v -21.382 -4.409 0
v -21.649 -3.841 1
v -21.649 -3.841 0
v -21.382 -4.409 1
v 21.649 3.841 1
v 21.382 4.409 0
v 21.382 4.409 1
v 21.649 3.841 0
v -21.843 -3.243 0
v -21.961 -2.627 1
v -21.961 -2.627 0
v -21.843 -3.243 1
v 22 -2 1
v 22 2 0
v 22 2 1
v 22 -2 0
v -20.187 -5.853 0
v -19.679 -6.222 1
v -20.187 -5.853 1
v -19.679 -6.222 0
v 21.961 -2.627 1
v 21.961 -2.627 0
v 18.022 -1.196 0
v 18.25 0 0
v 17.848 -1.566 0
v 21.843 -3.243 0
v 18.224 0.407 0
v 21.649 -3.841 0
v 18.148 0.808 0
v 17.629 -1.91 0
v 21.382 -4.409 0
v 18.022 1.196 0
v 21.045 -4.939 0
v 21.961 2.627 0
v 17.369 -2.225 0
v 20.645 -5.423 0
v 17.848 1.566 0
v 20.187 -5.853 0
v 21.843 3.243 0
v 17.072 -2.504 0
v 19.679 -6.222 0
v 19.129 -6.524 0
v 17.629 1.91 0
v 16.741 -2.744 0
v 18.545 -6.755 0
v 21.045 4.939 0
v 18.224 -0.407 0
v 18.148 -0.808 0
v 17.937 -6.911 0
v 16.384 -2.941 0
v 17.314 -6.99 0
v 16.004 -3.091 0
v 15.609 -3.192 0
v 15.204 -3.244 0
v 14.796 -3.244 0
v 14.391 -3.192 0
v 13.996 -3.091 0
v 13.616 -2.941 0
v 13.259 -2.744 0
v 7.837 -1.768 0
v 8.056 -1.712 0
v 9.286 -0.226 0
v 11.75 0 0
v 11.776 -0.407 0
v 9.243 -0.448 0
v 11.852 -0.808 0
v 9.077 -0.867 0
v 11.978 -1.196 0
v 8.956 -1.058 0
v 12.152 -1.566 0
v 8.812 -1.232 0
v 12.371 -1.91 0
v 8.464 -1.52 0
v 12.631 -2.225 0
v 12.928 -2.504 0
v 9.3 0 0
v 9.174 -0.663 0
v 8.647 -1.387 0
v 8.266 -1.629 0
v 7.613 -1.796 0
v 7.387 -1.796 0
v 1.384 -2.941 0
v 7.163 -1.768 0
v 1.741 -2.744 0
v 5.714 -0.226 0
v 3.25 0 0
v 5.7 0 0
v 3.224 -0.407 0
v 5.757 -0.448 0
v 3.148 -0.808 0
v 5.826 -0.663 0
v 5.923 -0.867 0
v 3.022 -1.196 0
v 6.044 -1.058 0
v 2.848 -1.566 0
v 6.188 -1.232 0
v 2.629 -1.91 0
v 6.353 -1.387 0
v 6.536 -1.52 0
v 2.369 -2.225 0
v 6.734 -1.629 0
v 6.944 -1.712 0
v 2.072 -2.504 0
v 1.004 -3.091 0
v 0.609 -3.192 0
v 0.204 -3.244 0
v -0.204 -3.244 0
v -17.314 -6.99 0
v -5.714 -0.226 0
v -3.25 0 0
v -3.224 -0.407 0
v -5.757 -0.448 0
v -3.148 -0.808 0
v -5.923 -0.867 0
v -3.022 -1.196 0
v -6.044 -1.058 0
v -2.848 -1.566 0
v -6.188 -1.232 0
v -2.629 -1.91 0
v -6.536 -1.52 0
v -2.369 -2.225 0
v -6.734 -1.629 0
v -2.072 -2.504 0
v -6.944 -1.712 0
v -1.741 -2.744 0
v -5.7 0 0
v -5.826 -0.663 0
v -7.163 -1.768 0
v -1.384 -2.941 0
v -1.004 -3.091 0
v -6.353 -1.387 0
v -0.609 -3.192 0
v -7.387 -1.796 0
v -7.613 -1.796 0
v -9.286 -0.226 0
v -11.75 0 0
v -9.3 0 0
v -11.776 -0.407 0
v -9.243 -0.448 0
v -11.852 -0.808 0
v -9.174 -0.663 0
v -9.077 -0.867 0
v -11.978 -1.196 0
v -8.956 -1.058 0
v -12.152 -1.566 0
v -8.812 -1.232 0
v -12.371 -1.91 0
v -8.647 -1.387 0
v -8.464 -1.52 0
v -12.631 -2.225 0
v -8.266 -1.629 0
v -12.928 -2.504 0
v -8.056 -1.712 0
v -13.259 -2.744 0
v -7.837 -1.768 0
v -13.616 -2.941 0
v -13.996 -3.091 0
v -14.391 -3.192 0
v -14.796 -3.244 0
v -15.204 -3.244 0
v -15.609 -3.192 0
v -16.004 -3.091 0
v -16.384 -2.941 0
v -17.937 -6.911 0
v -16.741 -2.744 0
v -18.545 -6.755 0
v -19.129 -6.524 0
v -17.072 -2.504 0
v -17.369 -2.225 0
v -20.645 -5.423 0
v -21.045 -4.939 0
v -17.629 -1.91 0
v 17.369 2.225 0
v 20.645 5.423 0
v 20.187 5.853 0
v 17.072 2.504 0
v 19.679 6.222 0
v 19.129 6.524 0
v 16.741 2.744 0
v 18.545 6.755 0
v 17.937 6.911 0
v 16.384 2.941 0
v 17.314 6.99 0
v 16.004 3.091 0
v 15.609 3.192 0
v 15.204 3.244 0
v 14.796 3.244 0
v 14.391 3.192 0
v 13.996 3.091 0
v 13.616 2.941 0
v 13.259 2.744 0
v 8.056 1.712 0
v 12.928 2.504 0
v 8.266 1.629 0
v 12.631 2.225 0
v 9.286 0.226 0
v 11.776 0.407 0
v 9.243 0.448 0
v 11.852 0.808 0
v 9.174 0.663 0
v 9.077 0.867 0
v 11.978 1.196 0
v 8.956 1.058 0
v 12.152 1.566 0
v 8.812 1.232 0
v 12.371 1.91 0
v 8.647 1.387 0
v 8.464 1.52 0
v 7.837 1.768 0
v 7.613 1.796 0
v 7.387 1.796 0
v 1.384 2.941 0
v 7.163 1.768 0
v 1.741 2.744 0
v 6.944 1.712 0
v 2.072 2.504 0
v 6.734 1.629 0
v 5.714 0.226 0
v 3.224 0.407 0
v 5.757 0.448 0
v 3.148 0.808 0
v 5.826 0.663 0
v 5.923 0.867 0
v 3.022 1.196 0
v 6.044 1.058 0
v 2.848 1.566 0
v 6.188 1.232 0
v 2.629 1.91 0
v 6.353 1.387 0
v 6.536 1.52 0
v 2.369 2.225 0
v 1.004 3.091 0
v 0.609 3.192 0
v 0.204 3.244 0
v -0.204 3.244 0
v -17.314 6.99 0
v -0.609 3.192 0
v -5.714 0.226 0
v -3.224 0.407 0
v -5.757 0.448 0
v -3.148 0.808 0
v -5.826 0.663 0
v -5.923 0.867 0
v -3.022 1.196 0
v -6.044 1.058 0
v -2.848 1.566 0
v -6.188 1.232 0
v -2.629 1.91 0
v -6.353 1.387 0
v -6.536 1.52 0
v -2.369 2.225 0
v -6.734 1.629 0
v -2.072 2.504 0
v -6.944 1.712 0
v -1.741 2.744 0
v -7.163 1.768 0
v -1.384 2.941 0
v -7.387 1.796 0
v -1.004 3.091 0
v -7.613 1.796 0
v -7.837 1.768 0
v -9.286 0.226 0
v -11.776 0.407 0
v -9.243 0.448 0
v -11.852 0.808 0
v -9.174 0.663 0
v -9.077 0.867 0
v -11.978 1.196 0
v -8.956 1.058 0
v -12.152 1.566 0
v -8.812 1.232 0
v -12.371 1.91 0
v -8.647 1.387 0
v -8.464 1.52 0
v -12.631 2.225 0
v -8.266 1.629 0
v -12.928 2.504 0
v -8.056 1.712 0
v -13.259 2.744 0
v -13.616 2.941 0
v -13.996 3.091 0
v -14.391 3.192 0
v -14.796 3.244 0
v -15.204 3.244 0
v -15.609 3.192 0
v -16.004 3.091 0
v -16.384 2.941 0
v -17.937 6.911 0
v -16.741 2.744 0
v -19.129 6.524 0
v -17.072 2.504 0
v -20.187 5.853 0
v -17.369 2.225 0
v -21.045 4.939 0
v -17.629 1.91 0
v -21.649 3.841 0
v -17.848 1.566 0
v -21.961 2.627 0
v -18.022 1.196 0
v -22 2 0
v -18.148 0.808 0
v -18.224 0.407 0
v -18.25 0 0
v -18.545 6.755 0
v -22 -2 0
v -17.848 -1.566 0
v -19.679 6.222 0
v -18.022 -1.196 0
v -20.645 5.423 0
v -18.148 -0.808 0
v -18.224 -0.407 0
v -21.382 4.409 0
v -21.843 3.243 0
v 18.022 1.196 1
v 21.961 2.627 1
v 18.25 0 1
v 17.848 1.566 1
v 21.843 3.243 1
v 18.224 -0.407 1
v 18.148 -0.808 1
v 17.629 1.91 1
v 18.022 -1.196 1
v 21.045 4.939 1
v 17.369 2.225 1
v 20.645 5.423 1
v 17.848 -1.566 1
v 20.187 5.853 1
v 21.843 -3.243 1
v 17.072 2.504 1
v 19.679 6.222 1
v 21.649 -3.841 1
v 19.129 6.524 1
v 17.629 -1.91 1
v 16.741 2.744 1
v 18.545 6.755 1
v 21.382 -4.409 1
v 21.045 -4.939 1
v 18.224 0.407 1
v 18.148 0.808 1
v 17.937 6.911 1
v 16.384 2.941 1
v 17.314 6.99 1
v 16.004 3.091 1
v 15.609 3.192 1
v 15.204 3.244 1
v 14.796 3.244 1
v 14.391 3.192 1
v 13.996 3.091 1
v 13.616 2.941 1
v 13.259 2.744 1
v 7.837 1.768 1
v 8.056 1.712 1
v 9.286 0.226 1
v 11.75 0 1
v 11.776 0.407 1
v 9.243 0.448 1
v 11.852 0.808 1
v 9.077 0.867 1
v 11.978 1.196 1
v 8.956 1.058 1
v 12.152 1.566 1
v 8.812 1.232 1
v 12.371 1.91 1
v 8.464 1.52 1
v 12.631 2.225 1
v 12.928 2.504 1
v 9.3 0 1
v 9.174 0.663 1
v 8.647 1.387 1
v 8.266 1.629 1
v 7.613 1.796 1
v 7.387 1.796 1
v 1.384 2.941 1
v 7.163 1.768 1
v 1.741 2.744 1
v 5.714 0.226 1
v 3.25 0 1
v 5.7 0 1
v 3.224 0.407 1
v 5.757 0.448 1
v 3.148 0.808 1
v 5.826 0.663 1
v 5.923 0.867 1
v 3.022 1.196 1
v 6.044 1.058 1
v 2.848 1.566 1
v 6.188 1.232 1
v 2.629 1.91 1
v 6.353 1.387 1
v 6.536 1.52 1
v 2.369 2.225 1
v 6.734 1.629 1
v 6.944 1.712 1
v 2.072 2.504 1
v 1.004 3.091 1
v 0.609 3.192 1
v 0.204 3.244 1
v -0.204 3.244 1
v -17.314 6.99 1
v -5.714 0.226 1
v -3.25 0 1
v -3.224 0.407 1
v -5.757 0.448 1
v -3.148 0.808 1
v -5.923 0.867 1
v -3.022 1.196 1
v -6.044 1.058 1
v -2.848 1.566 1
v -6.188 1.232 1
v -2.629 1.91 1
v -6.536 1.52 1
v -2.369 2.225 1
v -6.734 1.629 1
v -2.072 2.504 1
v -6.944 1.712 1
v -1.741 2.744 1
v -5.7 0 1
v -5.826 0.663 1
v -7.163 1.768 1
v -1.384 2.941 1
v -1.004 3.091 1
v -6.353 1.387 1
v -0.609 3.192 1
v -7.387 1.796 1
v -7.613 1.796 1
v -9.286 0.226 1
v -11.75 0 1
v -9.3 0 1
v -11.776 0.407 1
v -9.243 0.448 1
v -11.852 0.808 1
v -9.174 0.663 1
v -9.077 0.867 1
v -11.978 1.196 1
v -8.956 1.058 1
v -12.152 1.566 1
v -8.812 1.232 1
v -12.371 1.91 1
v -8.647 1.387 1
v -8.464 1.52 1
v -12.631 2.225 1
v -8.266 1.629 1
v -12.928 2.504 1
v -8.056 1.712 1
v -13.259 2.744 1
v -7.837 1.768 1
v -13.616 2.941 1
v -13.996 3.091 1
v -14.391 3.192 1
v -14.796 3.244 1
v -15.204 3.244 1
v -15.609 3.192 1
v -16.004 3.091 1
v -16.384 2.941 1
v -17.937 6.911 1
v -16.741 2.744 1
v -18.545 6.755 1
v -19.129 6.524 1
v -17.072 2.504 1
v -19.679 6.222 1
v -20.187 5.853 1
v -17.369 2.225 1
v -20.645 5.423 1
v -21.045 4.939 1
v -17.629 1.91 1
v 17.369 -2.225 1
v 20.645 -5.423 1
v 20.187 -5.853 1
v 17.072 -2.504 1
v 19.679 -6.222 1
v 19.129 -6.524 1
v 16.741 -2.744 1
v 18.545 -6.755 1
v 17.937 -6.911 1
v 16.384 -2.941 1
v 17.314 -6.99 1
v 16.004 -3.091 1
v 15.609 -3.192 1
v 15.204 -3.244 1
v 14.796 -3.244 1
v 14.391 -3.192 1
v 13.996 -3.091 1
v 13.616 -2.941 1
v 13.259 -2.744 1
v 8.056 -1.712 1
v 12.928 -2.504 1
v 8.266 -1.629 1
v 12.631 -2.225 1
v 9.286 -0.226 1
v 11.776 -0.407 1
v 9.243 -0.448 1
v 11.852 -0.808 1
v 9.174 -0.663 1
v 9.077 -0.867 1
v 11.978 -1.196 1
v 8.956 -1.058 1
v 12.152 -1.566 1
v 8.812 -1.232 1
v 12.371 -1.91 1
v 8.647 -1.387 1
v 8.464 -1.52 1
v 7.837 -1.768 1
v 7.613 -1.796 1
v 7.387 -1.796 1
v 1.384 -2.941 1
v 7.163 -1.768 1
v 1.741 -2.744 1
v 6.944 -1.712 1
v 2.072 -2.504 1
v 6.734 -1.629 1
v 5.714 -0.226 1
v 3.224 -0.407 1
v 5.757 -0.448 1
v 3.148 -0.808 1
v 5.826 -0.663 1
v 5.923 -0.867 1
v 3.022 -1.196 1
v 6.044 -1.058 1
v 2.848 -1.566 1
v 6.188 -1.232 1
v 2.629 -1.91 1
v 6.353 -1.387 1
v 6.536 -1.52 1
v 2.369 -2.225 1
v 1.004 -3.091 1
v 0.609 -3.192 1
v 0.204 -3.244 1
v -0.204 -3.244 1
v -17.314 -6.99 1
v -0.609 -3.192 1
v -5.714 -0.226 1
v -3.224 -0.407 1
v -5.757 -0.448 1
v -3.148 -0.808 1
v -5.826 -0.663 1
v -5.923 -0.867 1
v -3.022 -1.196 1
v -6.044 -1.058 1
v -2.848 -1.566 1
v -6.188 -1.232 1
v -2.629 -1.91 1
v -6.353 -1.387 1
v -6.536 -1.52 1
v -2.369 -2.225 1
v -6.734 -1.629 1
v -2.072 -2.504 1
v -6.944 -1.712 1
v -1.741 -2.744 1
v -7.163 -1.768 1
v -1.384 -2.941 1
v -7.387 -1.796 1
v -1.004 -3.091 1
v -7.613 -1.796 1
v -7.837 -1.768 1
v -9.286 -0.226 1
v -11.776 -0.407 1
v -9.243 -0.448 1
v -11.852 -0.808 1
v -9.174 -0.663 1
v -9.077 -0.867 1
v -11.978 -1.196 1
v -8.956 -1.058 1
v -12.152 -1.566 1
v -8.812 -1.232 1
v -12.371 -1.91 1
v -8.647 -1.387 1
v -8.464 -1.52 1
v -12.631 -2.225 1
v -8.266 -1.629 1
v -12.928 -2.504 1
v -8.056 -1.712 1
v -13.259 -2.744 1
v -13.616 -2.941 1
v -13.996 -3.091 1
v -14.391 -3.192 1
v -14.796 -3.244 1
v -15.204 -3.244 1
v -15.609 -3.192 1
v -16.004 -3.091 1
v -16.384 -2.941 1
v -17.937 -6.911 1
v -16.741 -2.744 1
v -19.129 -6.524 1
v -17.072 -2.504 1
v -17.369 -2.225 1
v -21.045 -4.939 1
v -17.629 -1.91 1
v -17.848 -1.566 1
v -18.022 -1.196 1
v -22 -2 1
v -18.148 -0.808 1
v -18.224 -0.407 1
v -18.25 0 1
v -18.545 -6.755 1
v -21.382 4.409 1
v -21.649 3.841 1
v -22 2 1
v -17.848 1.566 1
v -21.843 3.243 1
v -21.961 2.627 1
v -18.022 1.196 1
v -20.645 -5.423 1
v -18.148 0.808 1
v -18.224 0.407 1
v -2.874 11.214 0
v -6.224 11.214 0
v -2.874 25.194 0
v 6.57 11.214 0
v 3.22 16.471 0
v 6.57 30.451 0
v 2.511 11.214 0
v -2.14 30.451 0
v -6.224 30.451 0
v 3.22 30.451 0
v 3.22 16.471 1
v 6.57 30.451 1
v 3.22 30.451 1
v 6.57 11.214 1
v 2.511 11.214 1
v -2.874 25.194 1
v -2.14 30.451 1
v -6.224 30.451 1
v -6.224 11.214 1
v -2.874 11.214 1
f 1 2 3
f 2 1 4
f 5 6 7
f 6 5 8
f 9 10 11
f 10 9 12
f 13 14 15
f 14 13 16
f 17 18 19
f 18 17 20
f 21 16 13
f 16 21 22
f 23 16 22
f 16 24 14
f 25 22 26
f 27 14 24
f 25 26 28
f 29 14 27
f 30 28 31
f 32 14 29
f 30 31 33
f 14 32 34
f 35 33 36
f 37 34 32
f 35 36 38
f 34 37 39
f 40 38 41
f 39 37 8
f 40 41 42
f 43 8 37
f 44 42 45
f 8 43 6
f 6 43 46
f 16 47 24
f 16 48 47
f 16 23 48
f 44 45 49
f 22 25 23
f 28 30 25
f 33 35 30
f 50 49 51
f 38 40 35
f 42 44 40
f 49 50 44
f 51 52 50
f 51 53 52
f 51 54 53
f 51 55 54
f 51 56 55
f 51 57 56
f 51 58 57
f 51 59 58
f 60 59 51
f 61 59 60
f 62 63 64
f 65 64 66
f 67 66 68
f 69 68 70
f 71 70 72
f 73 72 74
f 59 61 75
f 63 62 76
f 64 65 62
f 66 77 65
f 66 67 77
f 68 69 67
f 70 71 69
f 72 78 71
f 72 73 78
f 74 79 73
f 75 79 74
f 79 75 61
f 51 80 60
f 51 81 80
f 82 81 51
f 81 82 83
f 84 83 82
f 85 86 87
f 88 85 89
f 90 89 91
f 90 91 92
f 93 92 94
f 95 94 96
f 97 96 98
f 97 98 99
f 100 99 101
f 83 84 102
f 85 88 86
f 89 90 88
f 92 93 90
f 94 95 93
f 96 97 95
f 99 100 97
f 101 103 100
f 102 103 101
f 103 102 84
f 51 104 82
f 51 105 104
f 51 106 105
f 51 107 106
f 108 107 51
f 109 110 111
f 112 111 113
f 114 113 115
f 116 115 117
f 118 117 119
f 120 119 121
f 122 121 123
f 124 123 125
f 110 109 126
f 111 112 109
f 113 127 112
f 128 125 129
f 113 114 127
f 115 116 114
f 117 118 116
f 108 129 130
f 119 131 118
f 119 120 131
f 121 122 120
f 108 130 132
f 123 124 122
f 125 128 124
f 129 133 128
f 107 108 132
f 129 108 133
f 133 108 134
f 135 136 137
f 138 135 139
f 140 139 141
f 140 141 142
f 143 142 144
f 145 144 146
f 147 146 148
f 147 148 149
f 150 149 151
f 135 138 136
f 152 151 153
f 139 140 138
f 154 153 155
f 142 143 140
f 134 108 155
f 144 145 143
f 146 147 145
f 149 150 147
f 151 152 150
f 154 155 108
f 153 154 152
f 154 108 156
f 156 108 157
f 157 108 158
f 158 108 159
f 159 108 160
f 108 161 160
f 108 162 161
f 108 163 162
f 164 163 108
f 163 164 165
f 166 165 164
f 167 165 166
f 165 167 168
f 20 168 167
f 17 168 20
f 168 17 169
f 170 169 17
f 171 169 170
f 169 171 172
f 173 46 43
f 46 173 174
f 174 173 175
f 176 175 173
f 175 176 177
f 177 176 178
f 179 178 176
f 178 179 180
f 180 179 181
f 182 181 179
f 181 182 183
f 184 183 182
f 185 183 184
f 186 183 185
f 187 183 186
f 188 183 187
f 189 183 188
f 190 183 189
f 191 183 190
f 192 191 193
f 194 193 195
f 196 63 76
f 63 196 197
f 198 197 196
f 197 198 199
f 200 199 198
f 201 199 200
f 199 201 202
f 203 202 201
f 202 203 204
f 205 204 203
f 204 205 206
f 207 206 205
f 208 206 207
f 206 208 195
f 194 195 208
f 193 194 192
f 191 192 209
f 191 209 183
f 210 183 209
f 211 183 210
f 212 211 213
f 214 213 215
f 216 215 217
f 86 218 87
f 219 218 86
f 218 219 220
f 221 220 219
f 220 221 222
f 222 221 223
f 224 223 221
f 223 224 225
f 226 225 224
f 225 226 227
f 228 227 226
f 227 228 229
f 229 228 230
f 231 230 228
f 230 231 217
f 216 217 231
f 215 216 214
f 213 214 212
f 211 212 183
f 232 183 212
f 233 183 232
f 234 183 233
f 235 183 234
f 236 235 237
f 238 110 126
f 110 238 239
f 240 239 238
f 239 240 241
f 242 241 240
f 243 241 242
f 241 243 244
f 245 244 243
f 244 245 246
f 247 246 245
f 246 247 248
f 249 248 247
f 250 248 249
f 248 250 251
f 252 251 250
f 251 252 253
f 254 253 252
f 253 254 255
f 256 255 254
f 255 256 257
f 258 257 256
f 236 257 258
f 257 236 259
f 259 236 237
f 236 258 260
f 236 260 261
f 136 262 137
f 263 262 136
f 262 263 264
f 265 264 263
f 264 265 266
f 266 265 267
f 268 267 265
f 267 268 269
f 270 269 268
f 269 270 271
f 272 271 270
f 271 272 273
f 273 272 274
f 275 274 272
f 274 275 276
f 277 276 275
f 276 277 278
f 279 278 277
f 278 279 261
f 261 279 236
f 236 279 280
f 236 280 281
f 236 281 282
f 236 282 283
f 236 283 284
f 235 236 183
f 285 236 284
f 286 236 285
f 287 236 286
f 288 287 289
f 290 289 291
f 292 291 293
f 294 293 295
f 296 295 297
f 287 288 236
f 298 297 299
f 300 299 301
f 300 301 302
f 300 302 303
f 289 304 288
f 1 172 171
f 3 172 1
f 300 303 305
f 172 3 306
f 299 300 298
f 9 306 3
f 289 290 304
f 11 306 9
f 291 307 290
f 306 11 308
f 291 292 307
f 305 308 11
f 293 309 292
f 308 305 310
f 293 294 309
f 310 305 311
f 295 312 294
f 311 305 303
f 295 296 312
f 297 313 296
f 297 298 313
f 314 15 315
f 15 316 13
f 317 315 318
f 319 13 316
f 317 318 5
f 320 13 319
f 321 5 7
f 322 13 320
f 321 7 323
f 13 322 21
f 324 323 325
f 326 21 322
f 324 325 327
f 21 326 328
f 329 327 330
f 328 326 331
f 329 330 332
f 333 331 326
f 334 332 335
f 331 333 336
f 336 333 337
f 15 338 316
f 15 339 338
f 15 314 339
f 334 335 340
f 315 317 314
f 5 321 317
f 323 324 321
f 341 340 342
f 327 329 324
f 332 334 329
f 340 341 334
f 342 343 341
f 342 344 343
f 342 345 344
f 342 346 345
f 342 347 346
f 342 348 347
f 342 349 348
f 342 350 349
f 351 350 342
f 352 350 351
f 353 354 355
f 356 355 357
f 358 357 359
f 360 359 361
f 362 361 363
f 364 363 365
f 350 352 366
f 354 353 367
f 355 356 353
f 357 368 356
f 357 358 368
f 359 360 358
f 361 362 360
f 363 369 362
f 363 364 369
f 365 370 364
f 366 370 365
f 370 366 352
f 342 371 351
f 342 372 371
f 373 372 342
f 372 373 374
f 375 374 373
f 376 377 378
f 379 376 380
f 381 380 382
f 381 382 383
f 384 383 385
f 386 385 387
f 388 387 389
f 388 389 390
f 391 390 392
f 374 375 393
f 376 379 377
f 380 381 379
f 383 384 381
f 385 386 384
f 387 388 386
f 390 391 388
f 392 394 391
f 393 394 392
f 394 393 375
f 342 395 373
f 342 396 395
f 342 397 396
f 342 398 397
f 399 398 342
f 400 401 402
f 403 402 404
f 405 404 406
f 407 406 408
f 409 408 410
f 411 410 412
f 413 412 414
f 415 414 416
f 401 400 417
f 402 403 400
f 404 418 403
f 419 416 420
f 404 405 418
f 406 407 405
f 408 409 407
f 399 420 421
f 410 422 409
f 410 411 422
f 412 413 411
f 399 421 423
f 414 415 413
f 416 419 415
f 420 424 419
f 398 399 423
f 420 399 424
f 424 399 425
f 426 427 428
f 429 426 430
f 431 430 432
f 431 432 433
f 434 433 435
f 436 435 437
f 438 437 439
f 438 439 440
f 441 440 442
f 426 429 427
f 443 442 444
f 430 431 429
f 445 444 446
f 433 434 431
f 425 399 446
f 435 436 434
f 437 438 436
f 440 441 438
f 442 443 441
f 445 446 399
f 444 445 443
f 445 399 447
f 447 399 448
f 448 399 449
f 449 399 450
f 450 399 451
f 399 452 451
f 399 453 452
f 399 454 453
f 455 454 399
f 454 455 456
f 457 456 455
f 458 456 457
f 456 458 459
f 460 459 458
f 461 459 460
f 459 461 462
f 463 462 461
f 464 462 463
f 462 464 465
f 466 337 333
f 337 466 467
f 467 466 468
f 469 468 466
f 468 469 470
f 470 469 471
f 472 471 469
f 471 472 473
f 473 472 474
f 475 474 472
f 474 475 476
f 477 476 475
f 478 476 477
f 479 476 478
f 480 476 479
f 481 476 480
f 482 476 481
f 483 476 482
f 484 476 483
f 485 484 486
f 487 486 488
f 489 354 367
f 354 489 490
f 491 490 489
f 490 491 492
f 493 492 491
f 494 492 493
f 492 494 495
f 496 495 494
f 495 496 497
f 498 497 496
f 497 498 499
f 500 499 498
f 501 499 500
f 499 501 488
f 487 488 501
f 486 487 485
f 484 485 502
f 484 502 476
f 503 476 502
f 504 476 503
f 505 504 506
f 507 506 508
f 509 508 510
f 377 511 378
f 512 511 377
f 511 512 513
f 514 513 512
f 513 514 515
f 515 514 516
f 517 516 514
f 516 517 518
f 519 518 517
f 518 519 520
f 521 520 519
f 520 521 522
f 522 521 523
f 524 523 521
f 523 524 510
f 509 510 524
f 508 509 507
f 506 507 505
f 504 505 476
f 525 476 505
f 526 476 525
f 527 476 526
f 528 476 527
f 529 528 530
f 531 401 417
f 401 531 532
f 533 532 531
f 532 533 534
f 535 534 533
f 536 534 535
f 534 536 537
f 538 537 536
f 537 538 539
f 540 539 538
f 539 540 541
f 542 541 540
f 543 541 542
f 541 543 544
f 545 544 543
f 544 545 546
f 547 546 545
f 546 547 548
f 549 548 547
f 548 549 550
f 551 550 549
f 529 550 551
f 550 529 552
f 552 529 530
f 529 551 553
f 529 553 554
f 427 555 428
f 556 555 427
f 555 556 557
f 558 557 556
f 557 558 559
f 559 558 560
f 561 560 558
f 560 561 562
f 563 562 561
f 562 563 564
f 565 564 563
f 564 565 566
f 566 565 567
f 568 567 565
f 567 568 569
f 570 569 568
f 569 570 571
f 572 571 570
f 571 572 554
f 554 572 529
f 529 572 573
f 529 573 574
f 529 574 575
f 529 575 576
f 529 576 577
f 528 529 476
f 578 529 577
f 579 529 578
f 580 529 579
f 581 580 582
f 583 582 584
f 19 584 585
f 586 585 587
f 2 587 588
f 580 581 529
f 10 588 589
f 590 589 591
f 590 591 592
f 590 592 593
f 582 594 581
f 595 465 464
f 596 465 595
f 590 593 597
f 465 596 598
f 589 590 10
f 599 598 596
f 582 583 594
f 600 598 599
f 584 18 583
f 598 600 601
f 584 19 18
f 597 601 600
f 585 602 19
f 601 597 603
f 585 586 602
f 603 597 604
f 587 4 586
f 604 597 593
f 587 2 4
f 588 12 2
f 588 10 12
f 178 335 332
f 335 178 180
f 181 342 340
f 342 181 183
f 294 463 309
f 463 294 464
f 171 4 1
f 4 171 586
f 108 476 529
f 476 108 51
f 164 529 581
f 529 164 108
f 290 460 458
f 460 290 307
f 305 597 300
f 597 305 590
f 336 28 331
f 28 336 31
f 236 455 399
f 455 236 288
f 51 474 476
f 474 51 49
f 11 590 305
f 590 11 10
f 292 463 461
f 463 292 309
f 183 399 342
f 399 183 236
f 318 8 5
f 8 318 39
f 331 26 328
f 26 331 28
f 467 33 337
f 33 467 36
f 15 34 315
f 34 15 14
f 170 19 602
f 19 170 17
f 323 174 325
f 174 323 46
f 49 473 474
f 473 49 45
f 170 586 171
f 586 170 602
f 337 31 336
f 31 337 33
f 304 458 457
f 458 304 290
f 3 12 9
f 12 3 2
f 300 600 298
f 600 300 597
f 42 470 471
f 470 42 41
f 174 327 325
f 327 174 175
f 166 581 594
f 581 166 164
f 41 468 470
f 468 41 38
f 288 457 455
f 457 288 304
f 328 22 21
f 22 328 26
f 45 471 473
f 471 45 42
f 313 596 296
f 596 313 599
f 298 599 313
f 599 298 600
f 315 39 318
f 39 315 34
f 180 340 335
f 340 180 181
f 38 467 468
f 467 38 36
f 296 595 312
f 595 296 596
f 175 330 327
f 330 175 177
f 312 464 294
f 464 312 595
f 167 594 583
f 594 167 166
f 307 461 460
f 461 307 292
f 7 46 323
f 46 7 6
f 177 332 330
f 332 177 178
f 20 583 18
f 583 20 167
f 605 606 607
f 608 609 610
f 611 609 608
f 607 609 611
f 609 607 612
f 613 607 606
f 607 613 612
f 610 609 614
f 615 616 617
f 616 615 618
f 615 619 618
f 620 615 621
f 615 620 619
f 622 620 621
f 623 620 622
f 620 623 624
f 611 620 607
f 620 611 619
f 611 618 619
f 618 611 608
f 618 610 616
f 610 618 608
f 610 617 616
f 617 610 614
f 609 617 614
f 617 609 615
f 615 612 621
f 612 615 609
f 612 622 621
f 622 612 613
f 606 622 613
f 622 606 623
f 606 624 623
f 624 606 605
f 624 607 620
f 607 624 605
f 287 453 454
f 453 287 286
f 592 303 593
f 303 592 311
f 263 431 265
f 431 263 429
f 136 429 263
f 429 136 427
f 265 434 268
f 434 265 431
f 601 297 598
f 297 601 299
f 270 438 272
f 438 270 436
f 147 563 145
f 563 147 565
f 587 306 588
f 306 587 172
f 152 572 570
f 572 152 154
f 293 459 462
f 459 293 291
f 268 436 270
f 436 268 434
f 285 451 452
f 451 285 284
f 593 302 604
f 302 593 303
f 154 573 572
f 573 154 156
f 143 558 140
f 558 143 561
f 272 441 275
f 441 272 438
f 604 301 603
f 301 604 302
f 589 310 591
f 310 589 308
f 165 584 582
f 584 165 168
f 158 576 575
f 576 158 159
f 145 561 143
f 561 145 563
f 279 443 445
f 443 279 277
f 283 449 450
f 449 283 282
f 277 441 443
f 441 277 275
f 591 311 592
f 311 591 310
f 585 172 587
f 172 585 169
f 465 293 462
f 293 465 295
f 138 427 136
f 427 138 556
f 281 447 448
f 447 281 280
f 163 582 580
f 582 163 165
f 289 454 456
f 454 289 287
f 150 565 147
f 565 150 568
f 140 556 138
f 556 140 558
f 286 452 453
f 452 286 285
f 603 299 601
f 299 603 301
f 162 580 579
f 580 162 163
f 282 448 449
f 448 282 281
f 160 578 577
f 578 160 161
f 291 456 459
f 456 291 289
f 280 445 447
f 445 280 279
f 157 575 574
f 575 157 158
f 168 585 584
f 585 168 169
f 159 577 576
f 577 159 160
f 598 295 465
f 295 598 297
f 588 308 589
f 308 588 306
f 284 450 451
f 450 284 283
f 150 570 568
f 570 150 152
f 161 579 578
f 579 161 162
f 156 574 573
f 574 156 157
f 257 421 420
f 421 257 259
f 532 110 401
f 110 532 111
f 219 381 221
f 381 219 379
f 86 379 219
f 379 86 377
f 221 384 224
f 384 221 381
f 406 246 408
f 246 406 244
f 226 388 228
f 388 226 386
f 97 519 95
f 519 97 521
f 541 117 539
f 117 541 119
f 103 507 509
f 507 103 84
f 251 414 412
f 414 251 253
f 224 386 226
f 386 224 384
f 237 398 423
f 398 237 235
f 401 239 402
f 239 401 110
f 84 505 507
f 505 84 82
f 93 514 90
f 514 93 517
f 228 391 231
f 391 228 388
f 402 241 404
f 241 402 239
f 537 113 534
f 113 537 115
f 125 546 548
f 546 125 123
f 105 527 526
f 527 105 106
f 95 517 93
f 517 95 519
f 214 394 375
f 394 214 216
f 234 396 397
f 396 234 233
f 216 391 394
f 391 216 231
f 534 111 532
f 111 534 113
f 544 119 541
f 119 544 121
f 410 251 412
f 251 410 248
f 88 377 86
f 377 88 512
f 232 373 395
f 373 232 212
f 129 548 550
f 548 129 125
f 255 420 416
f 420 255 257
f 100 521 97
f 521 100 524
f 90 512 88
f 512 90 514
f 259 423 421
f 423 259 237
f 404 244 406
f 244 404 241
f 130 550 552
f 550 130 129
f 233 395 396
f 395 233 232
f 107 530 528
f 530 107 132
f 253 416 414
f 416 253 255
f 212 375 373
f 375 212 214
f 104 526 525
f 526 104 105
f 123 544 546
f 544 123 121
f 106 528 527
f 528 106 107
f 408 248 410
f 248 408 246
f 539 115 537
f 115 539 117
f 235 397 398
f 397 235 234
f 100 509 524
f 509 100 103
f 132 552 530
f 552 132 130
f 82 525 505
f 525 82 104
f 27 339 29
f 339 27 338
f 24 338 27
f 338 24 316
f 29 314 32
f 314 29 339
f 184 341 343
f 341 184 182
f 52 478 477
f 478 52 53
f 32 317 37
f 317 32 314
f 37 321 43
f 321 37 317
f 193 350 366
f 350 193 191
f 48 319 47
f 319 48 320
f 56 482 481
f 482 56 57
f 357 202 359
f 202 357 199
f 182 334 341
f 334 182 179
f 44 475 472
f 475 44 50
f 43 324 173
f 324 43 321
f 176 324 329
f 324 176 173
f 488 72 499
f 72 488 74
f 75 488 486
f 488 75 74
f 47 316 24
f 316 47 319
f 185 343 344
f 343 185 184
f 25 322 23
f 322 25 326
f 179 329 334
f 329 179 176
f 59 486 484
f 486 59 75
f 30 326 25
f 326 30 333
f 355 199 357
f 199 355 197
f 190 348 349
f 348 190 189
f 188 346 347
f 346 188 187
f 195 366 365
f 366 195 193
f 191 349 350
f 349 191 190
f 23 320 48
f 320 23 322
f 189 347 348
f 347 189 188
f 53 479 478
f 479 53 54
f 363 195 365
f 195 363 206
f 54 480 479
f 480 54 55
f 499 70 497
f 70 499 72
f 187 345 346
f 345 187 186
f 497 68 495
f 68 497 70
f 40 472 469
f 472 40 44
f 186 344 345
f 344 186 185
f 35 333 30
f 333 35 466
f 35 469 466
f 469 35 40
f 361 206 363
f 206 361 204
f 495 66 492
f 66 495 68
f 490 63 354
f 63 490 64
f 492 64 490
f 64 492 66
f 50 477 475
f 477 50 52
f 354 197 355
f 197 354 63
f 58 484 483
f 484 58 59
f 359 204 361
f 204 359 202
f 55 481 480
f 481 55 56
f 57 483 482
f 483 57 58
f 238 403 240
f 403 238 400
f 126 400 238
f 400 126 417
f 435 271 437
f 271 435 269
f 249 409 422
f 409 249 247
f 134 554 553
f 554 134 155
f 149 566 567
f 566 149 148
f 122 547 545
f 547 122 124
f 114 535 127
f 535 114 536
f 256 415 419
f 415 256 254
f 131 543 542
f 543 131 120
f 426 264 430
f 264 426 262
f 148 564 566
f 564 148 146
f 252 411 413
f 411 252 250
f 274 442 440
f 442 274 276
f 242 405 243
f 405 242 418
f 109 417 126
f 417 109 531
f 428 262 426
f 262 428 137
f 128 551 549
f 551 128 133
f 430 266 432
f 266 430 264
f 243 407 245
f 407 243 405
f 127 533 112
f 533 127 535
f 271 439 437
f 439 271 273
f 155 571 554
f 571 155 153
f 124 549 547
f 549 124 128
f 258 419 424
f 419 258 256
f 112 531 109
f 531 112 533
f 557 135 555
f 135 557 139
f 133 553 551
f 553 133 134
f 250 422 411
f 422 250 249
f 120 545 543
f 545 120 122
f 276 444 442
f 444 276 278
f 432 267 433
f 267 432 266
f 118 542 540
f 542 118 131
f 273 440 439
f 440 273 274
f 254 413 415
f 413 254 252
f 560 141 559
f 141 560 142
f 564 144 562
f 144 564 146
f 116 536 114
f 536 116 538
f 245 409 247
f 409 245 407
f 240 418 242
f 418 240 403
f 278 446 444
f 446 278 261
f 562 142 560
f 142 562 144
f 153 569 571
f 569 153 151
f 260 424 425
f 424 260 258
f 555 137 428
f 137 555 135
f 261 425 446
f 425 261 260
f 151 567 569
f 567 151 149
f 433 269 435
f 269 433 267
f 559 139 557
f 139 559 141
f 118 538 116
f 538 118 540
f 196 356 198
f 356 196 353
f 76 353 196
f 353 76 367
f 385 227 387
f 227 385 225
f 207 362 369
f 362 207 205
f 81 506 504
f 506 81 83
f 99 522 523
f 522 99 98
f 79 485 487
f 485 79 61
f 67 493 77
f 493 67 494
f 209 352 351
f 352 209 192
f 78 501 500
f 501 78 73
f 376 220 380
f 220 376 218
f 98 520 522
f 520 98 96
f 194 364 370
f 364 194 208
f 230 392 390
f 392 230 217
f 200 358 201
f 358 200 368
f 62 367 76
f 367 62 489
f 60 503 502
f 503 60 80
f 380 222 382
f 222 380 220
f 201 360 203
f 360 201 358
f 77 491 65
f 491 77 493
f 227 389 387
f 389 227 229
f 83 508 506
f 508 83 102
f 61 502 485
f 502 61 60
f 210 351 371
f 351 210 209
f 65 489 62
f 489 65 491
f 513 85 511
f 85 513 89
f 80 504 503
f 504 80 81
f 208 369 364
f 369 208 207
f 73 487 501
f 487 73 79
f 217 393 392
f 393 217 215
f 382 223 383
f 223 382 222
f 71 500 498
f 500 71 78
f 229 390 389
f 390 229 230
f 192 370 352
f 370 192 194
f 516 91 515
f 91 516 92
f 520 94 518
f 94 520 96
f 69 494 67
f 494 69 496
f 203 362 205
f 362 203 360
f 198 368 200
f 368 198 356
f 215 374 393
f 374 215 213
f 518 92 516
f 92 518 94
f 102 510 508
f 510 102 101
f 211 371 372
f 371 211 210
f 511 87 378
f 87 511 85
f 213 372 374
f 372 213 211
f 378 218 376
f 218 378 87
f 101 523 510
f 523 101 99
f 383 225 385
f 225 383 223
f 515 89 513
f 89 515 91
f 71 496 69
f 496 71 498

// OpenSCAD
$fn = 50;


difference() {
	union() {
		hull() {
			translate(v = [-17.0000000000, 2.0000000000, 0]) {
				cylinder(h = 1, r = 5);
			}
			translate(v = [17.0000000000, 2.0000000000, 0]) {
				cylinder(h = 1, r = 5);
			}
			translate(v = [-17.0000000000, -2.0000000000, 0]) {
				cylinder(h = 1, r = 5);
			}
			translate(v = [17.0000000000, -2.0000000000, 0]) {
				cylinder(h = 1, r = 5);
			}
		}
		translate(v = [0, 30.0000000000, 0]) {
			linear_extrude(height = 1) {
				text(font = "DejaVu Sans Mono:style=Bold", halign = "center", size = 19.0000000000, text = "N", valign = "top");
			}
		}
	}
	union() {
		translate(v = [-15.0000000000, 0.0000000000, 0]) {
			translate(v = [0, 0, -100]) {
				cylinder(h = 200, r = 3.2500000000);
			}
		}
		translate(v = [0, 0, -100]) {
			cylinder(h = 200, r = 3.2500000000);
		}
		translate(v = [15.0000000000, 0.0000000000, 0]) {
			translate(v = [0, 0, -100]) {
				cylinder(h = 200, r = 3.2500000000);
			}
		}
		translate(v = [-15.0000000000, 0.0000000000, 0]) {
			translate(v = [0, 0, -100]) {
				cylinder(h = 200, r = 1.8000000000);
			}
		}
		translate(v = [-7.5000000000, 0.0000000000, 0]) {
			translate(v = [0, 0, -100]) {
				cylinder(h = 200, r = 1.8000000000);
			}
		}
		translate(v = [0, 0, -100]) {
			cylinder(h = 200, r = 1.8000000000);
		}
		translate(v = [7.5000000000, 0.0000000000, 0]) {
			translate(v = [0, 0, -100]) {
				cylinder(h = 200, r = 1.8000000000);
			}
		}
		translate(v = [15.0000000000, 0.0000000000, 0]) {
			translate(v = [0, 0, -100]) {
				cylinder(h = 200, r = 1.8000000000);
			}
		}
	}
}
